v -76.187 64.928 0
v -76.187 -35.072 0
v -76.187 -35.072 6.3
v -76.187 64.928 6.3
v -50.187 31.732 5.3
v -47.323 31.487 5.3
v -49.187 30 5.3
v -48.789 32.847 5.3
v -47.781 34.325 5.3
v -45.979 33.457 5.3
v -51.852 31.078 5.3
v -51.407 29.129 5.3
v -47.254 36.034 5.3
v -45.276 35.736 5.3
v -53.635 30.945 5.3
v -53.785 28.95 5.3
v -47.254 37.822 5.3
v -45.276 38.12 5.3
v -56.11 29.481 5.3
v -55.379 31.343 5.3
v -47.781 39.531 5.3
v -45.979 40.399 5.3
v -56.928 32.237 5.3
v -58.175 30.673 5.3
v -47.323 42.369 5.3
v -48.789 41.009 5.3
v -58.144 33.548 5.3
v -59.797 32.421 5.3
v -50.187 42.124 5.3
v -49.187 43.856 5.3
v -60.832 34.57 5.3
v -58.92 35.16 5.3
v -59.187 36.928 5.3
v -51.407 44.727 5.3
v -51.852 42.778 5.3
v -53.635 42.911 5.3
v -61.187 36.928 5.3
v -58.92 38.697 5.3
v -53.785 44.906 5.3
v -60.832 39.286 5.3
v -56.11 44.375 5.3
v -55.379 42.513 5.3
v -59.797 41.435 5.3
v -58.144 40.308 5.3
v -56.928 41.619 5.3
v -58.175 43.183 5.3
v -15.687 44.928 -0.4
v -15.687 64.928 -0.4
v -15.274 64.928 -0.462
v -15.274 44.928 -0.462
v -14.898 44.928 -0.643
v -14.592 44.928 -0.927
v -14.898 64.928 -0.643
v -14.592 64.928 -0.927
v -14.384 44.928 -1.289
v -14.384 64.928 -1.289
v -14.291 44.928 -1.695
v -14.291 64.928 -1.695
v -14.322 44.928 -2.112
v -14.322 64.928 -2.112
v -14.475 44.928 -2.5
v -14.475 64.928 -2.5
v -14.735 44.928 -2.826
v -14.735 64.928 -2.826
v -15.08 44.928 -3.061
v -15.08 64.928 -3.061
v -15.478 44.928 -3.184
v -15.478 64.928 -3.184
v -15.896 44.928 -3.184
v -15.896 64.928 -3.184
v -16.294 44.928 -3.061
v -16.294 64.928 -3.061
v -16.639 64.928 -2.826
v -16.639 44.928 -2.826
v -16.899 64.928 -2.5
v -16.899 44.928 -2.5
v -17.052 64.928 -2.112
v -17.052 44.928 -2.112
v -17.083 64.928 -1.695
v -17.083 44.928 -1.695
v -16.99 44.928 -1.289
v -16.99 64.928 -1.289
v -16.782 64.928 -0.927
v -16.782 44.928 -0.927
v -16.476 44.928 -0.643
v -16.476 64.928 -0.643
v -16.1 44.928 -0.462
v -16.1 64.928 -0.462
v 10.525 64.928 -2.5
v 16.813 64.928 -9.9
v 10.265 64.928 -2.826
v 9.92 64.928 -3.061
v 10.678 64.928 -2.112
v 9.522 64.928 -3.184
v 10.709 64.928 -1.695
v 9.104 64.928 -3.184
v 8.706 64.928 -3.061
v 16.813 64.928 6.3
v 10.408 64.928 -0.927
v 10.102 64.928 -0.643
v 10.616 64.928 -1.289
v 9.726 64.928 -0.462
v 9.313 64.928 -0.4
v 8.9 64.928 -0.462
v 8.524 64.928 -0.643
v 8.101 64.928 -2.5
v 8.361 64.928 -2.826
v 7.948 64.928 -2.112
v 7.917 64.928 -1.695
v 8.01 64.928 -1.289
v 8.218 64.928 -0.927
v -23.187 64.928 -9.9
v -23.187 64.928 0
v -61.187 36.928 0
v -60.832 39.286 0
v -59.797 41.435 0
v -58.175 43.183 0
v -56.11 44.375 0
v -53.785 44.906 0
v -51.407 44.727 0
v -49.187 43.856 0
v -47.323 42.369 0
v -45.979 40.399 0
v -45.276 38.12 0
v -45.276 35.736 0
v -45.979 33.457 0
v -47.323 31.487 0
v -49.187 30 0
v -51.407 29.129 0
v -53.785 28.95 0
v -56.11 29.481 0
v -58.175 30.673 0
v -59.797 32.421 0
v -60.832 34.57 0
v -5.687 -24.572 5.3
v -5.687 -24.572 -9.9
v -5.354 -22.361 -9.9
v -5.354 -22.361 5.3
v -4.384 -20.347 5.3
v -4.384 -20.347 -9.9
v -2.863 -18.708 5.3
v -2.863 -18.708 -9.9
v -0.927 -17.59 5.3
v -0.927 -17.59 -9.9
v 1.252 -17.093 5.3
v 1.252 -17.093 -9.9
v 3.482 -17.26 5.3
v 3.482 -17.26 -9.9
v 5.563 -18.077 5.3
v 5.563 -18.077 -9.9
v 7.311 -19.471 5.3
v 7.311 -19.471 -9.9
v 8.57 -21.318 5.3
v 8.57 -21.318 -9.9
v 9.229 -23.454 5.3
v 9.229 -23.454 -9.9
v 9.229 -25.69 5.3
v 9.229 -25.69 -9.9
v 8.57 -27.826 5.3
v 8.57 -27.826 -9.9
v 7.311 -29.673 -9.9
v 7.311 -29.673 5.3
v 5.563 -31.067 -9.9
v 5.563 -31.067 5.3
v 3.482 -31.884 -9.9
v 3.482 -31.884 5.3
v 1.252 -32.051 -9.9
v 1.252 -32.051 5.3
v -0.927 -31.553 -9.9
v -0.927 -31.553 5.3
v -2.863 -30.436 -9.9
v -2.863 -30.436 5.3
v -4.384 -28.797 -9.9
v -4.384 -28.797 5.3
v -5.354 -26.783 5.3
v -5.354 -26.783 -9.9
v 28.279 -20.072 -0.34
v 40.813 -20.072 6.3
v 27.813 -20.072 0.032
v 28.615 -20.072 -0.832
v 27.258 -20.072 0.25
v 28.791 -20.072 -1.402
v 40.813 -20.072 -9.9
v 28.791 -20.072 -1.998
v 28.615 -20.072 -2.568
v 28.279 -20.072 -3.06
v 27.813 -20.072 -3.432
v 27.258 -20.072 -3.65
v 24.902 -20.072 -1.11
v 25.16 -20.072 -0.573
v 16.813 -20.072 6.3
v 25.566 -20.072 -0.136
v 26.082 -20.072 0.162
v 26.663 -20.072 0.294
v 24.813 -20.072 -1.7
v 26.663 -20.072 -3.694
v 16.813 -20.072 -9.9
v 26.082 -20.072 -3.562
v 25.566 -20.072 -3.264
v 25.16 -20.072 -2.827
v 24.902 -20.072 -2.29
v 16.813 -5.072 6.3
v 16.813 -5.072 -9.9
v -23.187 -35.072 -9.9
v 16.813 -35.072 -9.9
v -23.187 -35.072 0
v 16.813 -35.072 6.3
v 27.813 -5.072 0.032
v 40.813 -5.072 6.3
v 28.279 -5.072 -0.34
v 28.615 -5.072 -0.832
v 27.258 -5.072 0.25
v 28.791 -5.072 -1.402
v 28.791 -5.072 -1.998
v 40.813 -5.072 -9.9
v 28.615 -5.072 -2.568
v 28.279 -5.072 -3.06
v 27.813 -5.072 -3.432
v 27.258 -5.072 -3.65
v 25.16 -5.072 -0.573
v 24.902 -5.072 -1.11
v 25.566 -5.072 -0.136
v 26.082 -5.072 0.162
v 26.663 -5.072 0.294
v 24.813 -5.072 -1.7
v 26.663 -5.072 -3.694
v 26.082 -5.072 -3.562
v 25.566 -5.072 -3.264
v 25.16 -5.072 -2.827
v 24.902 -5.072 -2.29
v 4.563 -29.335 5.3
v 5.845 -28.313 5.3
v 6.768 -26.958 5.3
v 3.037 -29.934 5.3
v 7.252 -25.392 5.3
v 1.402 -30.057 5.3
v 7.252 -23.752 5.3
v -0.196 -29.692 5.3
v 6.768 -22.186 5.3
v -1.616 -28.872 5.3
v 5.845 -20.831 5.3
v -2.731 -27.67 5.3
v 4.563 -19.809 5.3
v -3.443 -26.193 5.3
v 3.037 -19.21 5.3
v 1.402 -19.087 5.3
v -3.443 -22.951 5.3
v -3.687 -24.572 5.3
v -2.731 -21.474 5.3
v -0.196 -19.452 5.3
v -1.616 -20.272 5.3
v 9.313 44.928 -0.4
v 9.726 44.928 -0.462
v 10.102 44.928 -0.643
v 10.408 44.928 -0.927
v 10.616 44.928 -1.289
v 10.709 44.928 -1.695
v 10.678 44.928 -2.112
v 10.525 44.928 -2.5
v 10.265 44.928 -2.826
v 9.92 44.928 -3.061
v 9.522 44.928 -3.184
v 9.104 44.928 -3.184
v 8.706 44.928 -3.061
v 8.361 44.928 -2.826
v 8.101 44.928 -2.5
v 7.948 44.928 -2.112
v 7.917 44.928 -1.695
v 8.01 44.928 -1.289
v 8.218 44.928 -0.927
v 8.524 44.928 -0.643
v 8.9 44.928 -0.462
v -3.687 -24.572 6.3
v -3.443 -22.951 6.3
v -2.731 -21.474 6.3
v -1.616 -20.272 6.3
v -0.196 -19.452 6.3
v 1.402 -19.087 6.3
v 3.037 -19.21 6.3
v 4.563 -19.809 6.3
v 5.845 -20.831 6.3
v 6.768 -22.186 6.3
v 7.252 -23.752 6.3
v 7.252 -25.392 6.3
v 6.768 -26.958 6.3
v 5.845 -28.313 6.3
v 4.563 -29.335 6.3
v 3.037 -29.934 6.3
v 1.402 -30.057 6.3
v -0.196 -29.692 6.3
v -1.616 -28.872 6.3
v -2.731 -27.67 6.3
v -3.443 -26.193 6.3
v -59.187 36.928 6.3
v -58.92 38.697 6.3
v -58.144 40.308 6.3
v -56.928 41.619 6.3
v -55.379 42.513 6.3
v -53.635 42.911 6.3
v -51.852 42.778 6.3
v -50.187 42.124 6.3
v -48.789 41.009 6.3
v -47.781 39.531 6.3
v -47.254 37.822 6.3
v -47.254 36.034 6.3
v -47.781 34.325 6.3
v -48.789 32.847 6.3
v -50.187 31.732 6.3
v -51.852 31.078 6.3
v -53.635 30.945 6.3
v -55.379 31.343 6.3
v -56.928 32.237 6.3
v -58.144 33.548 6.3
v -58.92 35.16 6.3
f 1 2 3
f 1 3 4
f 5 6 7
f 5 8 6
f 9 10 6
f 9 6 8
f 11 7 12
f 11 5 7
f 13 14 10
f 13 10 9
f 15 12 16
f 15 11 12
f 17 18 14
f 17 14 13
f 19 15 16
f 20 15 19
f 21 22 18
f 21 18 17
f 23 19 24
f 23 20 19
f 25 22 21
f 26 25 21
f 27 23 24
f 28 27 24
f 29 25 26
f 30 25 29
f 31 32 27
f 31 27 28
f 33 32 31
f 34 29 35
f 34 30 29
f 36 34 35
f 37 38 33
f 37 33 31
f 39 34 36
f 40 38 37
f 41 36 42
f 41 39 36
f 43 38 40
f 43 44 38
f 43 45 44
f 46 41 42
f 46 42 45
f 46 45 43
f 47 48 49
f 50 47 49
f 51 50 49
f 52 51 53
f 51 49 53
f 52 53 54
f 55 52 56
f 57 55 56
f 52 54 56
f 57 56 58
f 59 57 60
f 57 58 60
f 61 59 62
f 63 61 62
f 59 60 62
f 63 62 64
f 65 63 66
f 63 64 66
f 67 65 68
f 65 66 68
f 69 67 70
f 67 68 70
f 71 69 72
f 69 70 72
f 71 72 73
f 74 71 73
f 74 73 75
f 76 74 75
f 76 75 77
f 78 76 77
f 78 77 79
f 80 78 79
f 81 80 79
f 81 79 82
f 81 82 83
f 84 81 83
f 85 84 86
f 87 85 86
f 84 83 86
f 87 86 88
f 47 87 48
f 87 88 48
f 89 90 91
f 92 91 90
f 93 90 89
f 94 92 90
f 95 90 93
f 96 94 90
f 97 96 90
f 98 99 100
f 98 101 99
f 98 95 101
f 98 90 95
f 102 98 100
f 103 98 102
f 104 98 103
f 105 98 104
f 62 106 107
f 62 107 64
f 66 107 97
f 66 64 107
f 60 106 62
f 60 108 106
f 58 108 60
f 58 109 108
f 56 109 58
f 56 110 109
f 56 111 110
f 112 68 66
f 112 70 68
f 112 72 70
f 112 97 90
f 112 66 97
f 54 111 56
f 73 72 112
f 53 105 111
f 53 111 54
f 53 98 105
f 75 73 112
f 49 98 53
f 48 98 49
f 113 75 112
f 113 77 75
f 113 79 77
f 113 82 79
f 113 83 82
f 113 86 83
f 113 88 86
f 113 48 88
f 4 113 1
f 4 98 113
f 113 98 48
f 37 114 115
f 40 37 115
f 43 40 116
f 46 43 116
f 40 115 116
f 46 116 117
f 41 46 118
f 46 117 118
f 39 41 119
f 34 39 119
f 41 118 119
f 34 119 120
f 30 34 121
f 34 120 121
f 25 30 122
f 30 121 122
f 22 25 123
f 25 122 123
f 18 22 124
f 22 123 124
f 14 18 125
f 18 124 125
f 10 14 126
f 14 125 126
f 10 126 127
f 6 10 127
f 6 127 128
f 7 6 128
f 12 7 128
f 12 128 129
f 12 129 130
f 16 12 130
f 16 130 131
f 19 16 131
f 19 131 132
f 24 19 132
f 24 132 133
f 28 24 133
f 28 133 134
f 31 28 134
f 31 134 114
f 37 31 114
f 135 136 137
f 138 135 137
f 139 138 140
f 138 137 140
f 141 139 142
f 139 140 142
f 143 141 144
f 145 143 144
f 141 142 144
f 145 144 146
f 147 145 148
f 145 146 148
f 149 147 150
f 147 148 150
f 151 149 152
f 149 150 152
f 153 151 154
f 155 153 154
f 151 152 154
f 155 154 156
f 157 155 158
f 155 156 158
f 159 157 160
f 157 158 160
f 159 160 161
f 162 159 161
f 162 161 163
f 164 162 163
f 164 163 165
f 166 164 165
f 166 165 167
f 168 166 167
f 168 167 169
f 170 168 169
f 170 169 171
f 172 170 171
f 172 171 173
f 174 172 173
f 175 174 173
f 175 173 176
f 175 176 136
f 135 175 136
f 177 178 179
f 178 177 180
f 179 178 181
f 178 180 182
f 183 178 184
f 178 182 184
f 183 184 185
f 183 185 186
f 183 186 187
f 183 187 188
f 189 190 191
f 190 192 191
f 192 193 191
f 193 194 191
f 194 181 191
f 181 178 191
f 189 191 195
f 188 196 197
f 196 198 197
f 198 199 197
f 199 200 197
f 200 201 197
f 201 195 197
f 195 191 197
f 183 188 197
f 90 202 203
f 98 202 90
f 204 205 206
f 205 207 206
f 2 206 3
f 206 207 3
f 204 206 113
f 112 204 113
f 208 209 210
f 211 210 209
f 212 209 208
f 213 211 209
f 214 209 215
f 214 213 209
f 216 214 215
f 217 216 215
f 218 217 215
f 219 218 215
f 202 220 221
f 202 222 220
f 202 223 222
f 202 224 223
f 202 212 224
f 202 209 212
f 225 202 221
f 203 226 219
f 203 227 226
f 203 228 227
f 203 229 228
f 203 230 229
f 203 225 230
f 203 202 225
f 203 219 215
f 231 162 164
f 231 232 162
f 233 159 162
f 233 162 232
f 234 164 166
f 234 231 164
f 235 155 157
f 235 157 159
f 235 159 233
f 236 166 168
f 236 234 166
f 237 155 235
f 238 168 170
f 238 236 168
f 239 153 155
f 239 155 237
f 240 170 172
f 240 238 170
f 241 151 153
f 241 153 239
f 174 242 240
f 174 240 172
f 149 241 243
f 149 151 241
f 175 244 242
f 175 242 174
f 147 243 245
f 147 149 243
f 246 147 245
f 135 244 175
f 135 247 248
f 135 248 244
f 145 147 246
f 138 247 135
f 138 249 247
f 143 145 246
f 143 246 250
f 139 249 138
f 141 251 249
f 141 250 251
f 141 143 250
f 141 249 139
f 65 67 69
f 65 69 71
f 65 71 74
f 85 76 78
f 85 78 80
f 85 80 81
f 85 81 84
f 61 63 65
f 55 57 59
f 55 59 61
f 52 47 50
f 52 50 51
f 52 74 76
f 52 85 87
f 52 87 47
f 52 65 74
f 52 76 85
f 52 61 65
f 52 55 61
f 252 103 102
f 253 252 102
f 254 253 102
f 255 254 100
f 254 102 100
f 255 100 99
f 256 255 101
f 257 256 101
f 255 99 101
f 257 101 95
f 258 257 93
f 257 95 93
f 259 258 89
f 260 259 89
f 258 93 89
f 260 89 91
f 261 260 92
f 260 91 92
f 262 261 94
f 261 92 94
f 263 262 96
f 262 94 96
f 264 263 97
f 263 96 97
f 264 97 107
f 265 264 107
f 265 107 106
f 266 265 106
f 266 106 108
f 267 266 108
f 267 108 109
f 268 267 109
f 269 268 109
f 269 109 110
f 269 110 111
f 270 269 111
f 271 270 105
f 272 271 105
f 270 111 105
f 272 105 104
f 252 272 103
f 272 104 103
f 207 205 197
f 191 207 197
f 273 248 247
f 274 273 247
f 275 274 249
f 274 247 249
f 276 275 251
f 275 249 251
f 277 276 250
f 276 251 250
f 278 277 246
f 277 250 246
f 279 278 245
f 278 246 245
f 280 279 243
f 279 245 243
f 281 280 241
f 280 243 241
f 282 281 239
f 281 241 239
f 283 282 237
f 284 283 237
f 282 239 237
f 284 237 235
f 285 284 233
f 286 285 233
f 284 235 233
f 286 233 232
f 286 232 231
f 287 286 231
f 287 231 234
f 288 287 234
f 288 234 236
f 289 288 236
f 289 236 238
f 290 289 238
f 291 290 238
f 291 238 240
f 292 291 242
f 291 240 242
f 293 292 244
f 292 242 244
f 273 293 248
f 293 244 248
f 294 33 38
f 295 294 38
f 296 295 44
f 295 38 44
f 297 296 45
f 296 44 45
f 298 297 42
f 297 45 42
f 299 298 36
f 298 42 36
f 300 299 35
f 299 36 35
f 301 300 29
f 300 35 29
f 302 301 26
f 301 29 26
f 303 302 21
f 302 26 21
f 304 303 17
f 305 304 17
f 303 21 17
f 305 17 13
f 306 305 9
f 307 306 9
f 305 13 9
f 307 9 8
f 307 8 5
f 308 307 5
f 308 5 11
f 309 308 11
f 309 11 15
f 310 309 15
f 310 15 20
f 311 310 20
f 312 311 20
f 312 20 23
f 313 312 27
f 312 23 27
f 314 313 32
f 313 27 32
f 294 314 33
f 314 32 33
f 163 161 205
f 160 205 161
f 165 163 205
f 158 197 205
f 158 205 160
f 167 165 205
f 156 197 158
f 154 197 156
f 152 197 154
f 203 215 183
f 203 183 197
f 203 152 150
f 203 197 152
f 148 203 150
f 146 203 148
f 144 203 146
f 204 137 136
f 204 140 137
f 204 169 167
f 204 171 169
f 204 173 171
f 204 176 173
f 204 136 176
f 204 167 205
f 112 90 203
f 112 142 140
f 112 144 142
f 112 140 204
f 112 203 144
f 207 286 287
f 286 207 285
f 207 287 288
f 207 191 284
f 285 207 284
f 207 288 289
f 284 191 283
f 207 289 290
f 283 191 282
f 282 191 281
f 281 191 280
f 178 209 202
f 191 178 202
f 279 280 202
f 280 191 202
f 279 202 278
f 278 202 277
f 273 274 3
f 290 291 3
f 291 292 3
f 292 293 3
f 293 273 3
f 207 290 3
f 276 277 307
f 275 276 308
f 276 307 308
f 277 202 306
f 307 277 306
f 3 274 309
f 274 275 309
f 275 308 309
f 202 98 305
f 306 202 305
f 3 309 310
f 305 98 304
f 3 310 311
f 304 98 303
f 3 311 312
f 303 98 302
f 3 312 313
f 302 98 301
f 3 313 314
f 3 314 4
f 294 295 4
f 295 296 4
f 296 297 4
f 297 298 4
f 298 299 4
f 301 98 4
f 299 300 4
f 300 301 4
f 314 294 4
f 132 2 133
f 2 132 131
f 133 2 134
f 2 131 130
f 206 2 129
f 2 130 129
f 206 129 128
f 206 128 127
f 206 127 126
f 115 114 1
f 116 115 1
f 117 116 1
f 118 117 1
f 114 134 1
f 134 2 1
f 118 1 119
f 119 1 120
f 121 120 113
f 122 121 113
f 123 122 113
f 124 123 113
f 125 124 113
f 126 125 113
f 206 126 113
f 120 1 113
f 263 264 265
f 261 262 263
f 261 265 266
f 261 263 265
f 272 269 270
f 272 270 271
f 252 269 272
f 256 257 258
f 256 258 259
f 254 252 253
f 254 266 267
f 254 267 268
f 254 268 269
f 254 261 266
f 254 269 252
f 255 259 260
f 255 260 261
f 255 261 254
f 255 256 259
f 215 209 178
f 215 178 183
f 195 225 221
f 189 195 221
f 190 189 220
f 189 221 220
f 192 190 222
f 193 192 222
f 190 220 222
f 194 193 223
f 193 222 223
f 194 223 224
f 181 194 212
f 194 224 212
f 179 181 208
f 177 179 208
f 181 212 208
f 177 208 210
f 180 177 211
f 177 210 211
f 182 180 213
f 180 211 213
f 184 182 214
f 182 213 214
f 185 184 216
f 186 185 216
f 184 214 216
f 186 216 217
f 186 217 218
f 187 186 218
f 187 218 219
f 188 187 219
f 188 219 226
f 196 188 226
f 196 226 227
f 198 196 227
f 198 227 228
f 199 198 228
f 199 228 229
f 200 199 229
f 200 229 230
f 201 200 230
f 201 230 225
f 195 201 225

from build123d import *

# Parameters (mm, degrees)
SKETCH1_W           = 93
SKETCH1_H           = 100
BOSS_EXTRUDE2_DEPTH = 6.3
SKETCH3_W           = 40
SKETCH3_H           = 100
BOSS_EXTRUDE3_DEPTH = 9.9
SKETCH4_W           = 16.2
SKETCH4_H           = 15
BOSS_EXTRUDE4_DEPTH = 24
SKETCH5_R           = 2
CUT_EXTRUDE1_DEPTH  = 50
SKETCH6_R           = 7.5
CUT_EXTRUDE2_DEPTH  = 50
SKETCH7_R           = 8
CUT_EXTRUDE3_DEPTH  = 50
EXTRUDE_THIN1_START = -5.3
SKETCH7_2_R         = 8
SKETCH7_2_R_2       = 6
EXTRUDE_THIN1_DEPTH = 1
EXTRUDE_THIN2_START = -15.2
SKETCH6_2_R         = 7.5
SKETCH6_2_R_2       = 5.5
EXTRUDE_THIN2_DEPTH = 1
SKETCH8_R           = 1.4
CUT_EXTRUDE4_DEPTH  = 20


with BuildPart() as part:
    # Sketch1 → Boss-Extrude2 (new body)
    with BuildSketch(Plane.XY):
        with Locations((-29.68705036, 14.928057554)):
            Rectangle(SKETCH1_W, SKETCH1_H)
    extrude(amount=BOSS_EXTRUDE2_DEPTH)

    # Sketch3 → Boss-Extrude3 (add)
    with BuildSketch(Plane(origin=(0, 0, 0), x_dir=(-1, 0, 0), z_dir=(0, 0, -1))):
        with Locations((3.18705036, 14.928057554)):
            Rectangle(SKETCH3_W, SKETCH3_H)
    extrude(amount=BOSS_EXTRUDE3_DEPTH)

    # Sketch4 → Boss-Extrude4 (add)
    with BuildSketch(Plane(origin=(16.81294964, 0, 0), x_dir=(0, 0, -1), z_dir=(1, 0, 0))):
        with Locations((1.8, -12.571942446)):
            Rectangle(SKETCH4_W, SKETCH4_H)
    extrude(amount=BOSS_EXTRUDE4_DEPTH)

    # Sketch5 → Cut-Extrude1 (cut)
    with BuildSketch(Plane(origin=(0, -5.071942446, 0), x_dir=(1, 0, 0), z_dir=(0, 1, 0))):
        with Locations(Location((26.81294964, 1.7, 0), (0, 0, 180))):
            Circle(SKETCH5_R)
    extrude(amount=-CUT_EXTRUDE1_DEPTH, mode=Mode.SUBTRACT)

    # Sketch6 → Cut-Extrude2 (cut)
    with BuildSketch(Plane(origin=(0, 0, -9.9), x_dir=(-1, 0, 0), z_dir=(0, 0, -1))):
        with Locations((-1.81294964, -24.571942446)):
            Circle(SKETCH6_R)
    extrude(amount=-CUT_EXTRUDE2_DEPTH, mode=Mode.SUBTRACT)

    # Sketch7 → Cut-Extrude3 (cut)
    with BuildSketch(Plane(origin=(0, 0, 0), x_dir=(-1, 0, 0), z_dir=(0, 0, -1))):
        with Locations((53.18705036, 36.928057554)):
            Circle(SKETCH7_R)
    extrude(amount=-CUT_EXTRUDE3_DEPTH, mode=Mode.SUBTRACT)

    # Sketch7<2> → Extrude-Thin1 (add)
    with BuildSketch(Plane(origin=(0, 0, 0), x_dir=(-1, 0, 0), z_dir=(0, 0, -1)).offset(EXTRUDE_THIN1_START)):
        with Locations((53.18705036, 36.928057554)):
            Circle(SKETCH7_2_R)
        with Locations((53.18705036, 36.928057554)):
            Circle(SKETCH7_2_R_2, mode=Mode.SUBTRACT)
    extrude(amount=-EXTRUDE_THIN1_DEPTH)

    # Sketch6<2> → Extrude-Thin2 (add)
    with BuildSketch(Plane(origin=(0, 0, -9.9), x_dir=(-1, 0, 0), z_dir=(0, 0, -1)).offset(EXTRUDE_THIN2_START)):
        with Locations((-1.81294964, -24.571942446)):
            Circle(SKETCH6_2_R)
        with Locations((-1.81294964, -24.571942446)):
            Circle(SKETCH6_2_R_2, mode=Mode.SUBTRACT)
    extrude(amount=-EXTRUDE_THIN2_DEPTH)

    # Sketch8 → Cut-Extrude4 (cut)
    with BuildSketch(Plane(origin=(0, 64.928057554, 0), x_dir=(1, 0, 0), z_dir=(0, 1, 0))):
        with Locations(Location((-15.68705036, 1.8, 0), (0, 0, 270))):
            Circle(SKETCH8_R)
        with Locations(Location((9.31294964, 1.8, 0), (0, 0, 270))):
            Circle(SKETCH8_R)
    extrude(amount=-CUT_EXTRUDE4_DEPTH, mode=Mode.SUBTRACT)


solid = part.part
